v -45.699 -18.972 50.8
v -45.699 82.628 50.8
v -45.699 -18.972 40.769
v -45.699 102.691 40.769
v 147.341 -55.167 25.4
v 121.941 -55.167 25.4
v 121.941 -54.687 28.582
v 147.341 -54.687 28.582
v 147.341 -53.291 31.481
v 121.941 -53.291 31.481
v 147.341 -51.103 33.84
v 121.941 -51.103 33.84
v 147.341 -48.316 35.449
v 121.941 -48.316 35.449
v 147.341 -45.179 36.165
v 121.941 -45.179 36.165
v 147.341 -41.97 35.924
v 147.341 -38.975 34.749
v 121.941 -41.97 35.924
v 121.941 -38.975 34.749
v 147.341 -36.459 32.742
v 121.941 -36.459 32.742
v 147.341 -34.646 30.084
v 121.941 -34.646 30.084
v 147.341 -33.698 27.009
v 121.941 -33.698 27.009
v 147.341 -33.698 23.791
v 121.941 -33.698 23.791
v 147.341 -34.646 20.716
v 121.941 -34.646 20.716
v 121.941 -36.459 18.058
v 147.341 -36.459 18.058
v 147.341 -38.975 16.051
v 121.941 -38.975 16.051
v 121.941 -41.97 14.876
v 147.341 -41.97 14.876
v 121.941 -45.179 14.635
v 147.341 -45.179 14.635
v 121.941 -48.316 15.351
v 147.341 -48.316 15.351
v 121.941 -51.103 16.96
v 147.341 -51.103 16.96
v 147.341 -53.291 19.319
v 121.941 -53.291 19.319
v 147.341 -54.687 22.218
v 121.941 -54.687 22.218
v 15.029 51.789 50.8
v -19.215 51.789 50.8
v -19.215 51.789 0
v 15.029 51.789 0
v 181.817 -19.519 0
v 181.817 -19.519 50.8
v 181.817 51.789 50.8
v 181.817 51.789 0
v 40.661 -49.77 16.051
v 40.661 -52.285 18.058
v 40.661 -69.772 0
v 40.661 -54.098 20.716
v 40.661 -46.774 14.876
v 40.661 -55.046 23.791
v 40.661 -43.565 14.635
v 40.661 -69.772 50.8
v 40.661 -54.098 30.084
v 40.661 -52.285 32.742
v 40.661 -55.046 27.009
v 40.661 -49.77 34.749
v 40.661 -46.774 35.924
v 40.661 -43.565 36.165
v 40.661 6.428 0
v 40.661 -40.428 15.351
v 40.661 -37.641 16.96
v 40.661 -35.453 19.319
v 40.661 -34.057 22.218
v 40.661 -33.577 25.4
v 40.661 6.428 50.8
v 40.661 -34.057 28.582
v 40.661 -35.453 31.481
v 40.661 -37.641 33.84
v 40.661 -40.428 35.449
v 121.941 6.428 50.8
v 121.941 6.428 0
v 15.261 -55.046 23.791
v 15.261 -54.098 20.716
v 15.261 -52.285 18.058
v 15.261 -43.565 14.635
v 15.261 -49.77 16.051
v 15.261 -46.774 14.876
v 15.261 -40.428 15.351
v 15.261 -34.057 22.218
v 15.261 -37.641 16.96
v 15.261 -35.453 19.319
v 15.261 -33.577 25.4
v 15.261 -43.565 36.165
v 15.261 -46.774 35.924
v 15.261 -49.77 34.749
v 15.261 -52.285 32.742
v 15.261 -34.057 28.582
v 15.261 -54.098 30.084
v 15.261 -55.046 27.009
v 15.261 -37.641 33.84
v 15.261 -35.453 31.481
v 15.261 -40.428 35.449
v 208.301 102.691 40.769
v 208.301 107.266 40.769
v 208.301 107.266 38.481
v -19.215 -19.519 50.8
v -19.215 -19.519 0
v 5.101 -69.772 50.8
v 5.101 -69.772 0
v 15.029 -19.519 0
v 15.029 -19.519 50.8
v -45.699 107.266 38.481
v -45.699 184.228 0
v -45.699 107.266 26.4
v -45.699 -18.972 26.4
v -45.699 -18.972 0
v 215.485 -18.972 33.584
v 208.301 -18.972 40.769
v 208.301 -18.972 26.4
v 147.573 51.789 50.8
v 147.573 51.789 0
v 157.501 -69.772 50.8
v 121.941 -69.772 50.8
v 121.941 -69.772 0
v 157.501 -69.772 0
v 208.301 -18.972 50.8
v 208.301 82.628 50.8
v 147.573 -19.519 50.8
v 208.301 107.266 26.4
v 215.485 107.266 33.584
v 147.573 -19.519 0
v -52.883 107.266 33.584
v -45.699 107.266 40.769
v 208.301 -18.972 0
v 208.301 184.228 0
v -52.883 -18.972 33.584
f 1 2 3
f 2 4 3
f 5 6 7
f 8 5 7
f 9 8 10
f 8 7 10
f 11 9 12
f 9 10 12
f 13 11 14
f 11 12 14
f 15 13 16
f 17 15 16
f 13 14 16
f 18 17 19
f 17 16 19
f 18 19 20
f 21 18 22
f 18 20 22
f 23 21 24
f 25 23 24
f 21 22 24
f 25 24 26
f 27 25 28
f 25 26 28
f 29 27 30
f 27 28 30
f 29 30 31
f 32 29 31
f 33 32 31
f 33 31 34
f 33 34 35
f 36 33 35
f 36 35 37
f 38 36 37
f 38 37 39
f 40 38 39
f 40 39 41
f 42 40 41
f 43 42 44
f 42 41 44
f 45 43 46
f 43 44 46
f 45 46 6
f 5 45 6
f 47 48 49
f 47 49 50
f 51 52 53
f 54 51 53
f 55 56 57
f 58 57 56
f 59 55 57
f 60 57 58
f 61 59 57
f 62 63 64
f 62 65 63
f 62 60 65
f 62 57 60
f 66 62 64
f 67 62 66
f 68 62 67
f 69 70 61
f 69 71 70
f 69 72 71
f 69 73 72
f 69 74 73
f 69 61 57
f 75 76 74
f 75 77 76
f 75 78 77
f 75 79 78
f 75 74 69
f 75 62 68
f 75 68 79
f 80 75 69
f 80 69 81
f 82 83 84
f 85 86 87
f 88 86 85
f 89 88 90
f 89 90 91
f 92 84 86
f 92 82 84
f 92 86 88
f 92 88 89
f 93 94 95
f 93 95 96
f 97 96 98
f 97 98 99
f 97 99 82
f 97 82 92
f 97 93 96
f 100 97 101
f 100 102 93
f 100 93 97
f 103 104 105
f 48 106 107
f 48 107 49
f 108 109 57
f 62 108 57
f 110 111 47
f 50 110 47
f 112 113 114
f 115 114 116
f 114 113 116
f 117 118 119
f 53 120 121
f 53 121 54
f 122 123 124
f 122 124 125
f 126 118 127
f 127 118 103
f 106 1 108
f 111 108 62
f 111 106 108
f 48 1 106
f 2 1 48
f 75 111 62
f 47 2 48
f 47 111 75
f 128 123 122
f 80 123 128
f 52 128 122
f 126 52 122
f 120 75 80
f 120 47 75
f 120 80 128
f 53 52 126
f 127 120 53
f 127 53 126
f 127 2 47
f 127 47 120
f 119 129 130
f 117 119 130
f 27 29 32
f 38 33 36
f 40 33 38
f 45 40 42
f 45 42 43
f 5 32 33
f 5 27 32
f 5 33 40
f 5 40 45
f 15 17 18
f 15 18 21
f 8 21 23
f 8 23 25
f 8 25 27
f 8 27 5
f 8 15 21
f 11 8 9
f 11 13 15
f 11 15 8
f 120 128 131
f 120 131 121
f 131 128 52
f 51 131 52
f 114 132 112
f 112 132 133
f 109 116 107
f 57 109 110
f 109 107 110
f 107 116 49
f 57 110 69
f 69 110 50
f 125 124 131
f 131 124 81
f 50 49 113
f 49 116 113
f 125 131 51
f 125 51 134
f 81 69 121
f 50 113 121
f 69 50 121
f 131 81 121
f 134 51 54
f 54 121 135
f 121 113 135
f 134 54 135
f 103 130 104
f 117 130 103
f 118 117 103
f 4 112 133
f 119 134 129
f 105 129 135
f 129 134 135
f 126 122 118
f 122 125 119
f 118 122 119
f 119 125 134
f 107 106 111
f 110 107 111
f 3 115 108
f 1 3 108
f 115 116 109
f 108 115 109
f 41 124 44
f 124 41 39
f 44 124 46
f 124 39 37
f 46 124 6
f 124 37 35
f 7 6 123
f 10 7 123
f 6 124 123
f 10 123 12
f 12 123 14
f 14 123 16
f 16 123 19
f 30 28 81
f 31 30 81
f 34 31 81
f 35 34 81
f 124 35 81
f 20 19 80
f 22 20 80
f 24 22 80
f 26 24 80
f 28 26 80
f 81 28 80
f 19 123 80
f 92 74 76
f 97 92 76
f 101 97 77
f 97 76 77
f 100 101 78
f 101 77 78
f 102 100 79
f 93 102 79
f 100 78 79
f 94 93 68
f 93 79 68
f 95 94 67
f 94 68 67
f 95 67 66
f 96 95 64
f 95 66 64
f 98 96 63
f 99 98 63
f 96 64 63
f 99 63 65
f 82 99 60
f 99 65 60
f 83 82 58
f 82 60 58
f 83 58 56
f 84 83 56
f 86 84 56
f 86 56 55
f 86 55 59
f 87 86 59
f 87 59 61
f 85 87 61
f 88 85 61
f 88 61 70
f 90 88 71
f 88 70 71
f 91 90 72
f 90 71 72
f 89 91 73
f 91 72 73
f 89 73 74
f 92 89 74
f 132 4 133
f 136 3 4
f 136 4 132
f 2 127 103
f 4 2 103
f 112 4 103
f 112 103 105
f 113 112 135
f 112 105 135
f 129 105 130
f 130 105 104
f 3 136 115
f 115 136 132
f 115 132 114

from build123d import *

# Parameters (mm, degrees)
F1_DEPTH  = 50.8
F3_DEPTH  = 254.001
F4_W      = 81.28
F4_H      = 76.2
F5_DEPTH  = 50.801
F7_DEPTH  = 177.038
F8_W      = 14.2059672672
F8_H      = 54.5313454777
F8_W_2    = 25.0834482712
F8_H_2    = 56.1428241044
F9_DEPTH  = 50.801
F10_W     = 34.2439590022
F10_H     = 71.3080037385
F11_DEPTH = 50.801
F12_R     = 10.795
F13_DEPTH = 25.4
F14_R     = 10.795
F15_DEPTH = 25.4


# Not quite as in the source:
# - a feature names something its author has since deleted; it is built from what else it names


with BuildPart() as f1:
    # F0 (on Top) → F1 (new body)
    with BuildSketch(Plane.XY):
        Polygon((208.3008480269, 184.2279704243), (-45.6991519731, 184.2279704243), (-45.6991519731, -18.9720295757), (5.1008480269, -69.7720295757), (157.5008480269, -69.7720295757), (208.3008480269, -18.9720295757), align=None)
    extrude(amount=F1_DEPTH)

    # F2 (on face) → F3 (cut, through all)
    with BuildSketch(Plane.YZ.offset(208.3008480269)):
        Polygon((82.6279704243, 50.8), (184.2279704243, 0), (184.2279704243, 50.8), align=None)
    extrude(amount=-F3_DEPTH, mode=Mode.SUBTRACT)

    # F4 (on face) → F5 (cut, through all)
    with BuildSketch(Plane.XY.offset(50.8)):
        with Locations((81.3008480269, -31.6720295757)):
            Rectangle(F4_W, F4_H)
    extrude(amount=-F5_DEPTH, mode=Mode.SUBTRACT)

    # F6 (on face) → F7 (join)
    with BuildSketch(Plane.XZ.offset(69.7720295757)):
        Polygon((-52.88335687, 33.5843649413), (-45.6991519731, 26.4001600444), (-45.6991519731, 40.7685698381), align=None)
        Polygon((208.3008480269, 26.4001600444), (215.4850529237, 33.5843649413), (208.3008480269, 40.7685698381), align=None)
    extrude(amount=-F7_DEPTH)

    # F8 (on face) → F9 (cut, through all)
    with BuildSketch(Plane.XY.offset(50.8)):
        with Locations((-52.8021356067, -46.2377023146)):
            Rectangle(F8_W, F8_H)
        with Locations((220.8425721625, -47.0434416279)):
            Rectangle(F8_W_2, F8_H_2)
    extrude(amount=-F9_DEPTH, mode=Mode.SUBTRACT)

    # F10 (on face) → F11 (cut, through all)
    with BuildSketch(Plane.XY.offset(50.8)):
        with Locations((-2.0932615735, 16.1352222785)):
            Rectangle(F10_W, F10_H)
        with Locations((164.6949576272, 16.1352222785)):
            Rectangle(F10_W, F10_H)
    extrude(amount=-F11_DEPTH, mode=Mode.SUBTRACT)

    # F12 (on face) → F13 (cut)
    with BuildSketch(Plane.YZ.offset(40.6608480269)):
        with Locations((-44.3720295757, 25.4)):
            Circle(F12_R)
    extrude(amount=-F13_DEPTH, mode=Mode.SUBTRACT)

    # F14 (on face) → F15 (cut)
    with BuildSketch(Plane(origin=(121.9408480269, 0, 0), x_dir=(0, -1, 0), z_dir=(-1, 0, 0))):
        with Locations((44.3720295757, 25.4)):
            Circle(F14_R)
    extrude(amount=-F15_DEPTH, mode=Mode.SUBTRACT)


solid = f1.part
